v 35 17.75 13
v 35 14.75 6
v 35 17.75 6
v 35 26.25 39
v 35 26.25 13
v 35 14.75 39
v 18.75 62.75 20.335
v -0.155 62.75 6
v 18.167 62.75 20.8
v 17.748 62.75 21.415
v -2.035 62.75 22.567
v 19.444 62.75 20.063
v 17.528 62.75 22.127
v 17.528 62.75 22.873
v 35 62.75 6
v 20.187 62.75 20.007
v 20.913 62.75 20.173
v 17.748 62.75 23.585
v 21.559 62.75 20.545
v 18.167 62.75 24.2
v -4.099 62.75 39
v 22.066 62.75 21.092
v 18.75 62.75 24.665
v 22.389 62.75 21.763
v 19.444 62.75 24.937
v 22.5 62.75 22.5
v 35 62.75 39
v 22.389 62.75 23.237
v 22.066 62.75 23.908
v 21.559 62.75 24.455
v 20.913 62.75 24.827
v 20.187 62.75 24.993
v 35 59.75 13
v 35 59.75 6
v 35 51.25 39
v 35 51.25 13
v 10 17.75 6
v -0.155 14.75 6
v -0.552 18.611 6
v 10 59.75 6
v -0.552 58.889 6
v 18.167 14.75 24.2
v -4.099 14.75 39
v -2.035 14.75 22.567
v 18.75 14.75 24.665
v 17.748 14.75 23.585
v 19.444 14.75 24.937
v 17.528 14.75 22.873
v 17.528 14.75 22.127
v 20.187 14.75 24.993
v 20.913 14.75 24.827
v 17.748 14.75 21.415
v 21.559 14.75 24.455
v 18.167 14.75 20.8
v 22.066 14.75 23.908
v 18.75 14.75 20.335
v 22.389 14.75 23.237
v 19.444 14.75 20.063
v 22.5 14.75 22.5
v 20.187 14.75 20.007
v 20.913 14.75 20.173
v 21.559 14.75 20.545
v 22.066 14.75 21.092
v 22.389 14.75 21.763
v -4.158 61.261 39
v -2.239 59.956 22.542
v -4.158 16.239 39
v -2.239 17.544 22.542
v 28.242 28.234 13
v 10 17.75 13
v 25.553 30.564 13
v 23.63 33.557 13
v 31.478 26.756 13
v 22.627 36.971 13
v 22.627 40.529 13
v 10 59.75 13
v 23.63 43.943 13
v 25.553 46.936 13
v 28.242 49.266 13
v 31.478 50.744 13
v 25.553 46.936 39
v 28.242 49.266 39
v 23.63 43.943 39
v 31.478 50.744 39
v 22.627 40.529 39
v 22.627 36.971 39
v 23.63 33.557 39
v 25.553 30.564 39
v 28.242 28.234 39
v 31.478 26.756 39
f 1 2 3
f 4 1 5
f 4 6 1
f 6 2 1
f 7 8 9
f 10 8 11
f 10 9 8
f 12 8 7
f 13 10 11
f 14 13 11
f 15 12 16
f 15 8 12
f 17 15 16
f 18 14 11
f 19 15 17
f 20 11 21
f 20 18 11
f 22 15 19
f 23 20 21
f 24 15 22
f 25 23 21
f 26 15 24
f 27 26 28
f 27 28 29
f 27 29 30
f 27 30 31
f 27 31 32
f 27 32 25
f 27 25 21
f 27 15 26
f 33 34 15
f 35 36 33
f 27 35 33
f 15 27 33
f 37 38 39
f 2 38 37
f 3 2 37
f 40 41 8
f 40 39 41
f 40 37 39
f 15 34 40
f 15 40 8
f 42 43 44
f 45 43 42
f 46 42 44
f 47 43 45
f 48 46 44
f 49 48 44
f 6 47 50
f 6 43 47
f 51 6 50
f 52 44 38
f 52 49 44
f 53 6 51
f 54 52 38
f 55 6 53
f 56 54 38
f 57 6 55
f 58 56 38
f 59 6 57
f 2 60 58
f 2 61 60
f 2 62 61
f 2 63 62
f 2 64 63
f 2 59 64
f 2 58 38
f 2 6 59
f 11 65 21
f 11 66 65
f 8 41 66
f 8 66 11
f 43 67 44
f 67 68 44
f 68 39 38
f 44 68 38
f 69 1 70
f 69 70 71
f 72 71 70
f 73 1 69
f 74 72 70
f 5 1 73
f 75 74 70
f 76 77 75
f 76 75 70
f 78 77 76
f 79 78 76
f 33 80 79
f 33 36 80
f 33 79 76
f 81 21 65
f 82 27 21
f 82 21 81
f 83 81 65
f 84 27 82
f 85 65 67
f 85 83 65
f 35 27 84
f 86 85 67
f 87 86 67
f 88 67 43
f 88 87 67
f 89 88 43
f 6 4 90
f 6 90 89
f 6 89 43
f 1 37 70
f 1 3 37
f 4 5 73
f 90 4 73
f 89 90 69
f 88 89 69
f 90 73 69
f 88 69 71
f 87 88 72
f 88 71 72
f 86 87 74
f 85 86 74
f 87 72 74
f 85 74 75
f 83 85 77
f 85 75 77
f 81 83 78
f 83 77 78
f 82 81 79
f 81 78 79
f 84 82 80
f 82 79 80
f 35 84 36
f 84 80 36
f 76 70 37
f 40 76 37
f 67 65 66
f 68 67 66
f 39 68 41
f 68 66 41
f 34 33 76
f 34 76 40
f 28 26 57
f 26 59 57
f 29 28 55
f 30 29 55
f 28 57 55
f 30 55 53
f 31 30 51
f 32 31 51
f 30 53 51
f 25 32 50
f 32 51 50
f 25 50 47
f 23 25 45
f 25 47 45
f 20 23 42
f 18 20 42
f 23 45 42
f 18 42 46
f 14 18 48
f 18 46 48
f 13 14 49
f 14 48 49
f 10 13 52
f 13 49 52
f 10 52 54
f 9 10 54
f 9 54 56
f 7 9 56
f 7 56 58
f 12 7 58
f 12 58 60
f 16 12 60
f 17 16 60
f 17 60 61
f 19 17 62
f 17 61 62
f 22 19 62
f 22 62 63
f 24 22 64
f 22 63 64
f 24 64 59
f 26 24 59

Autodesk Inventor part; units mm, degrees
ref_plane "YZ Plane" through (0, 0, 0) normal (1, 0, 0) x (0, 1, 0)
ref_plane "XZ Plane" through (0, 0, 0) normal (0, 1, 0) x (-1, 0, 0)
ref_plane "XY Plane" through (0, 0, 0) normal (0, 0, 1) x (1, 0, 0)
sketch "Sketch1" plane through (0, 0, 0) normal (0, 0, 1) x (1, 0, 0)
  line L0 (0, 0) -> (70, 0)
  line L1 (70, 0) -> (70, 77.5)
  line L2 (70, 77.5) -> (0, 77.5)
  line L3 (0, 77.5) -> (0, 0)
  dimension "d0" = 70
  dimension "d1" = 77.5
extrude "Extrusion1" add sketch "Sketch1" along normal blind 95
sketch "Sketch3" plane through (0, 0, 95) normal (0, 0, 1) x (1, 0, 0)
  line L0 (0, 0) -> (70, 0) projected
  line L1 (70, 77.5) -> (0, 77.5) projected
  line L2 (70, 0) -> (35, 0)
  line L3 (35, 0) -> (35, 77.5)
  line L4 (35, 77.5) -> (70, 77.5)
  line L5 (70, 77.5) -> (70, 0)
extrude "Extrusion3" cut sketch "Sketch3" against normal through all
sketch "Sketch4" plane through (0, 77.5, 95) normal (0, 1, 0) x (1, 0, 0)
  line L0 (0, 95) -> (0, 0) projected
  line L1 (0, 0) -> (-12.5, 0)
  line L2 (35, 95) -> (0, 95) projected
  arc A0 (-12.5, 0) -> (0, 95) centre (-1145.4326, 197.3924) ccw
  line L3 (-12.5, -10) -> (35, -10) construction
  dimension "d9" = 1150
  dimension "d54" = 47.5
  dimension "d55" = 10
extrude "Extrusion4" add sketch "Sketch4" against normal blind 77.5
sketch "Sketch5" plane through (35, 0, 95) normal (1, 0, 0) x (0, 0, -1)
  line L0 (0, 77.5) -> (0, 86.25)
  line L1 (0, 0) -> (0, -8.75)
  line L2 (0, 0) -> (0, 77.5) projected
  line L3 (95, 77.5) -> (95, 0) projected
  arc A0 (0, 86.25) -> (95, 77.5) centre (152.8838, 1226.0423) ccw
  arc A1 (95, 0) -> (0, -8.75) centre (152.8838, -1148.5423) ccw
  line L4 (0, 77.5) -> (95, 77.5) projected
  line L5 (95, 0) -> (0, 0) projected
  line L6 (-10, 86.25) -> (-10, -8.75) construction
  point P0 (-10, 38.75)
  point P1 (0, 38.75)
  dimension "d14" = 1150
  dimension "d15" = 1150
  dimension "d52" = 10
  dimension "d53" = 95
extrude "Extrusion5" add sketch "Sketch5" against normal blind 55 contours L0 A0 L4 | L5 A1 L1
sketch "Sketch6" plane through (-20, 0, 0) normal (0, 1, 0) x (1, 0, 0)
  line L0 (20, 0) -> (0, 0) projected
  line L1 (0, -95) -> (0, 0) projected
  arc A0 (7.5, -95) -> (20, 0) centre (-1125.4326, 102.3924) ccw projected
  line L2 (7.5, -95) -> (0, -95) projected
extrude "Extrusion6" cut sketch "Sketch6" along normal through all both and the other way through all
fillet "Fillet3" radius 19 2 edges at (-5.299, 80.9203, 47.9253) (-5.299, -3.4203, 47.9253)
sketch "Sketch8" plane through (0, 0, 95) normal (0, 0, 1) x (1, 0, 0)
  line L0 (35, 86.25) -> (35, -8.75) projected
  line L1 (35, 77.5) -> (35, 0) projected
  circle A0 centre (35, 38.75) radius 35
  point P0 (0, 0)
  dimension "d23" = 70
extrude "Extrusion7" cut sketch "Sketch8" against normal blind 20
sketch "Sketch9" plane through (0, 0, 75) normal (0, 0, 1) x (1, 0, 0)
  line L0 (35, 73.75) -> (35, 3.75) projected
  circle A0 centre (35, 38.75) radius 15.5
  point P0 (0, 0)
  dimension "d26" = 31
extrude "Extrusion8" cut sketch "Sketch9" against normal blind 20
sketch "Sketch10" plane through (0, 0, 0) normal (0, 0, -1) x (-1, 0, 0)
  line L0 (-35, 77.5) -> (-35, 0) projected
  circle A0 centre (-35, 38.75) radius 12.5
  point P0 (0, 0)
  dimension "d29" = 25
extrude "Extrusion9" cut sketch "Sketch10" against normal blind 50
sketch "Sketch11" plane through (0, 0, 50) normal (0, 0, -1) x (-1, 0, 0)
  line L0 (-35, 26.25) -> (-35, 51.25) projected
  circle A0 centre (-35, 38.75) radius 2.5
  circle A1 centre (-26.5, 38.75) radius 2
  point P0 (0, 0)
  dimension "d32" = 5
  dimension "d33" = 4
  dimension "d34" = 8.5
extrude "Extrusion10" cut sketch "Sketch11" against normal through all
sketch "Sketch12" plane through (0, 0, 55) normal (0, 0, 1) x (1, 0, 0)
  circle A0 centre (26.5, 38.75) radius 2 projected
  circle A1 centre (26.5, 38.75) radius 4.5
  point P0 (0, 0)
  dimension "d37" = 9
extrude "Extrusion11" cut sketch "Sketch12" against normal blind 3
sketch "Sketch14" plane through (0, 0, 50) normal (0, 0, -1) x (-1, 0, 0)
  arc A0 (-35, 36.25) -> (-35, 41.25) centre (-35, 38.75) ccw projected
  circle A1 centre (-35, 38.75) radius 4
  point P0 (0, 0)
  dimension "d40" = 8
extrude "Extrusion12" cut sketch "Sketch14" against normal blind 3
sketch "Sketch15" plane through (0, 0, 75) normal (0, 0, 1) x (1, 0, 0)
  arc A0 (35, 41.25) -> (35, 36.25) centre (35, 38.75) ccw projected
  circle A1 centre (10, 38.75) radius 2.5
  circle A2 centre (22.5, 17.0994) radius 2.5
  circle A3 centre (47.5, 17.0994) radius 2.5
  circle A4 centre (60, 38.75) radius 2.5
  circle A5 centre (47.5, 60.4006) radius 2.5
  circle A6 centre (22.5, 60.4006) radius 2.5
  point P0 (0, 0)
  dimension "d43" = 5
  dimension "d44" = 25
  dimension "d47" = 360
extrude "Extrusion13" cut sketch "Sketch15" against normal blind 25
sketch "Sketch17" plane through (35, 73.75, 95) normal (1, 0, 0) x (0, 0, -1)
  line L0 (90, -60) -> (55, -60)
  line L1 (55, -60) -> (55, -10)
  line L2 (55, -10) -> (90, -10)
  line L3 (90, -10) -> (90, -60)
  line L4 (95, -22.5) -> (95, -47.5) projected
  line L5 (0, 12.5) -> (95, 12.5)
  line L6 (95, 12.5) -> (95, -82.5)
  line L7 (95, -82.5) -> (0, -82.5)
  line L8 (0, -82.5) -> (0, 12.5)
  point P0 (95, -73.75)
  point P1 (90, -35)
  point P2 (95, -35)
  dimension "d62" = 35
  dimension "d63" = 50
  dimension "d64" = 5
extrude "Extrusion16" cut sketch "Sketch17" against normal through all
sketch "Sketch18" plane through (35, 13.75, 5) normal (1, 0, 0) x (0, 0, -1)
  line L0 (0, 4) -> (-8, 4)
  line L1 (-8, 4) -> (-8, 46)
  line L2 (-8, 46) -> (0, 46)
  line L3 (0, 46) -> (0, 4)
  line L4 (-35, 37.5) -> (-35, 12.5) projected
  line L5 (0, 12.5) -> (0, 37.5) projected
  point P0 (5, -13.75)
  point P1 (0, 25)
  dimension "d69" = 42
  dimension "d70" = 8
extrude "Extrusion17" cut sketch "Sketch18" against normal blind 25
sketch "Sketch19" plane through (35, 13.75, 5) normal (0, -1, 0) x (1, 0, 0)
  circle A0 centre (-15, 17.5) radius 2.5
  line L0 (0, 35) -> (0, 0) projected
  point P0 (-35, -5)
  point P1 (0, 17.5)
  dimension "d73" = 5
  dimension "d74" = 15
extrude "Extrusion18" cut sketch "Sketch19" against normal through all
sketch "Sketch20" plane through (35, 51.25, 40) normal (1, 0, 0) x (0, 0, -1)
  line L0 (35, -37.5) -> (35, -33.5) projected
  line L1 (0, 12.5) -> (35, 12.5)
  line L2 (35, 12.5) -> (35, -37.5)
  line L3 (35, -37.5) -> (0, -37.5)
  line L4 (0, -37.5) -> (0, 12.5)
  line L5 (34, 11.5) -> (1, 11.5)
  line L6 (1, 11.5) -> (1, -36.5)
  line L7 (1, -36.5) -> (34, -36.5)
  line L8 (34, -36.5) -> (34, 11.5)
  point P0 (40, -51.25)
  dimension "d77" = 1
extrude "Extrusion19" cut sketch "Sketch20" against normal through all
properties part number "AA016" material "ABS Plastic"
